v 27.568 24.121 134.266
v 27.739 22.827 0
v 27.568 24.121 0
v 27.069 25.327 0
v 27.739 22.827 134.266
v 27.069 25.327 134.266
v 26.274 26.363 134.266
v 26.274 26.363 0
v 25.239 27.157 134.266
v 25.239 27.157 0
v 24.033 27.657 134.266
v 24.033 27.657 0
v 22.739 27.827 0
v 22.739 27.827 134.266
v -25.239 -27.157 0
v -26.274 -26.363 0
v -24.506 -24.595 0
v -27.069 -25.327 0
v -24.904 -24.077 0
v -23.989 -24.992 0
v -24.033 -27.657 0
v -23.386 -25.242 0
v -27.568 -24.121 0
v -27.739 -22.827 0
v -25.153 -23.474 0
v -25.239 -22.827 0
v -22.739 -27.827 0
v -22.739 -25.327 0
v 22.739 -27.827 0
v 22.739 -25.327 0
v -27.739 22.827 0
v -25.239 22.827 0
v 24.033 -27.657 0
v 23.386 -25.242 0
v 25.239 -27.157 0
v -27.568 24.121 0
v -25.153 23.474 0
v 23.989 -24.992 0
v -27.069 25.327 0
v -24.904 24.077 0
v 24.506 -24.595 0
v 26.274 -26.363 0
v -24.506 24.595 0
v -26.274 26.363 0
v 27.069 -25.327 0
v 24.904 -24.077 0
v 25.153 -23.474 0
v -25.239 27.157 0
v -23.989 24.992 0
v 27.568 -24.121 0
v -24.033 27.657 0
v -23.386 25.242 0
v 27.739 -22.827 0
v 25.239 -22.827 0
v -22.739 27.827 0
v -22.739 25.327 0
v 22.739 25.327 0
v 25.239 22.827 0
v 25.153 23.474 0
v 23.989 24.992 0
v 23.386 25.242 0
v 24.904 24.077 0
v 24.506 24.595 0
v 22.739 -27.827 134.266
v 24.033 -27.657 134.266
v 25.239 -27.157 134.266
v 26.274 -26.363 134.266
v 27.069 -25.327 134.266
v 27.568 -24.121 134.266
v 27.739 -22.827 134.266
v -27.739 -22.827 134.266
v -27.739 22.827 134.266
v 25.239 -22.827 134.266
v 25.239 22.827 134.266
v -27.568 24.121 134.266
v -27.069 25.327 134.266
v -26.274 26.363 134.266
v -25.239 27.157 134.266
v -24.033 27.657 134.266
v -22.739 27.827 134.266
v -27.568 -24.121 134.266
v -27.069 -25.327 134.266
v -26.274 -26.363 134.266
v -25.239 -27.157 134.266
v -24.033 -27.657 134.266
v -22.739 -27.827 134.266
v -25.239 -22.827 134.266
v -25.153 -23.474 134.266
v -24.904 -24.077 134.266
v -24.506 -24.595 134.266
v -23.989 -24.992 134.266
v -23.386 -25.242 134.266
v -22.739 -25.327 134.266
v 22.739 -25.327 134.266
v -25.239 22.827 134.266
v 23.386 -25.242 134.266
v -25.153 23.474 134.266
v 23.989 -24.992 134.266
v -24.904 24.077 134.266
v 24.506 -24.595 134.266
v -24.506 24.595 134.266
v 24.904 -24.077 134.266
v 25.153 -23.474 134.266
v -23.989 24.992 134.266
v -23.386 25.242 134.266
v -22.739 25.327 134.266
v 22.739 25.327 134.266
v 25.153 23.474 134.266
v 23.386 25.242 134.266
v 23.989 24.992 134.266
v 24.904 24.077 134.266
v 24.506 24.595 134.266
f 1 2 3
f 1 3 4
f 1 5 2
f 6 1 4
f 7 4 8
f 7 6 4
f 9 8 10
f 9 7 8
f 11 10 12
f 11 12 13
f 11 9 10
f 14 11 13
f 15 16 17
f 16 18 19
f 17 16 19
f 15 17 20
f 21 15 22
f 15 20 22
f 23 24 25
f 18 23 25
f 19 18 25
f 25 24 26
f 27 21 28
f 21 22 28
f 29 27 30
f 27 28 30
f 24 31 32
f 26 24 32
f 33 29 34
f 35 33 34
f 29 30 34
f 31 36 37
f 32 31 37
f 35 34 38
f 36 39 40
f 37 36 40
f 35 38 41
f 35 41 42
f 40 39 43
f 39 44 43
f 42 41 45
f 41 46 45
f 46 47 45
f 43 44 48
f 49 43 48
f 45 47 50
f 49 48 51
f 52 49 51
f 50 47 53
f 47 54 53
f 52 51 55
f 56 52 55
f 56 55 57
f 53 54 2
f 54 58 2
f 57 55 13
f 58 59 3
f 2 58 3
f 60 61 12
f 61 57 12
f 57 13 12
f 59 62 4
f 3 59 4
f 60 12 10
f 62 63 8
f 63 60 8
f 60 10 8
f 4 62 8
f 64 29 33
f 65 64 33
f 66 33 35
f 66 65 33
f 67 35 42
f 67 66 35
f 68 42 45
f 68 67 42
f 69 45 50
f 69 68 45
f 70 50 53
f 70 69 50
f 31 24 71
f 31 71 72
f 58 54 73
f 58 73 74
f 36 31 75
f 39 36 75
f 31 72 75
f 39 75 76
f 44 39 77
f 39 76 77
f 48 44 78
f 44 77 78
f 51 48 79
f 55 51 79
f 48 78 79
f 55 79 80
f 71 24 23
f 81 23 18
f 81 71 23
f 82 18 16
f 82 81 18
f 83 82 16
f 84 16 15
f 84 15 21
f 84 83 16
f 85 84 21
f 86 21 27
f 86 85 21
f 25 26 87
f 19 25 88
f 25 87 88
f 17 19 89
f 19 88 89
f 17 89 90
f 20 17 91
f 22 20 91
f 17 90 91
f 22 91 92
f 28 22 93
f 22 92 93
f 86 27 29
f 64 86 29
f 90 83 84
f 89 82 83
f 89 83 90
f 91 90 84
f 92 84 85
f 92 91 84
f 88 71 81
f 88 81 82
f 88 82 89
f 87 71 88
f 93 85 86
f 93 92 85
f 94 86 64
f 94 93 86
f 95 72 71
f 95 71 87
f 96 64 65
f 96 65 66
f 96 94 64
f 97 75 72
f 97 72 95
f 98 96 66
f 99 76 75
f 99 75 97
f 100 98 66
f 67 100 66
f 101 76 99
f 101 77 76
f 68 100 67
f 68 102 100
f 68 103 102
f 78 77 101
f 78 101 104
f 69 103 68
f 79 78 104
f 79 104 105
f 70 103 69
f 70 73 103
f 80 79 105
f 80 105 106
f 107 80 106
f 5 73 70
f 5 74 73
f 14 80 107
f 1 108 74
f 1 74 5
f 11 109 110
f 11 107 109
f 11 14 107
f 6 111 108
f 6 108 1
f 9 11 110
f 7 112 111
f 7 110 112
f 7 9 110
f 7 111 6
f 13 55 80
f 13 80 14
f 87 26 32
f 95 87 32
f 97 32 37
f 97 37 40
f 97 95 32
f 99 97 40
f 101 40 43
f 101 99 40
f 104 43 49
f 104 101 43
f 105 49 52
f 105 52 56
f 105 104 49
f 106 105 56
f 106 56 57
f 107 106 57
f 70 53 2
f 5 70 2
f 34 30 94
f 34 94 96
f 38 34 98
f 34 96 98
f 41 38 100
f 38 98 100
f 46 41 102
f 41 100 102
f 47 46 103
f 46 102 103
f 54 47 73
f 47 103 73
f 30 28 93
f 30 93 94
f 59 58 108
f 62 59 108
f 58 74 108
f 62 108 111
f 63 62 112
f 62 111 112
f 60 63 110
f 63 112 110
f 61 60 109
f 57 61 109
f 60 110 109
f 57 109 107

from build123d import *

# Parameters (mm, degrees)
F0_W     = 55.477142
F0_H     = 55.65466
F1_DEPTH = 134.265617
F2_R     = 5
F3_T     = -2.5


with BuildPart() as f1:
    # F0 (on Top) → F1 (new body)
    with BuildSketch(Plane.XY):
        Rectangle(F0_W, F0_H)
    extrude(amount=F1_DEPTH)

    # F2
    f2_edges = [f1.edges().sort_by_distance(p)[0] for p in [
        (27.738571, -27.82733, 67.132808),
        (27.738571, 27.82733, 67.132808),
        (-27.738571, -27.82733, 67.132808),
        (-27.738571, 27.82733, 67.132808),
    ]]
    fillet(f2_edges, radius=F2_R)

    # F3
    f3_openings = [f1.faces().sort_by_distance(p)[0] for p in [
        (0, 0, 134.265617),
        (0, 0, 0),
    ]]
    offset(amount=F3_T, openings=f3_openings)


solid = f1.part
